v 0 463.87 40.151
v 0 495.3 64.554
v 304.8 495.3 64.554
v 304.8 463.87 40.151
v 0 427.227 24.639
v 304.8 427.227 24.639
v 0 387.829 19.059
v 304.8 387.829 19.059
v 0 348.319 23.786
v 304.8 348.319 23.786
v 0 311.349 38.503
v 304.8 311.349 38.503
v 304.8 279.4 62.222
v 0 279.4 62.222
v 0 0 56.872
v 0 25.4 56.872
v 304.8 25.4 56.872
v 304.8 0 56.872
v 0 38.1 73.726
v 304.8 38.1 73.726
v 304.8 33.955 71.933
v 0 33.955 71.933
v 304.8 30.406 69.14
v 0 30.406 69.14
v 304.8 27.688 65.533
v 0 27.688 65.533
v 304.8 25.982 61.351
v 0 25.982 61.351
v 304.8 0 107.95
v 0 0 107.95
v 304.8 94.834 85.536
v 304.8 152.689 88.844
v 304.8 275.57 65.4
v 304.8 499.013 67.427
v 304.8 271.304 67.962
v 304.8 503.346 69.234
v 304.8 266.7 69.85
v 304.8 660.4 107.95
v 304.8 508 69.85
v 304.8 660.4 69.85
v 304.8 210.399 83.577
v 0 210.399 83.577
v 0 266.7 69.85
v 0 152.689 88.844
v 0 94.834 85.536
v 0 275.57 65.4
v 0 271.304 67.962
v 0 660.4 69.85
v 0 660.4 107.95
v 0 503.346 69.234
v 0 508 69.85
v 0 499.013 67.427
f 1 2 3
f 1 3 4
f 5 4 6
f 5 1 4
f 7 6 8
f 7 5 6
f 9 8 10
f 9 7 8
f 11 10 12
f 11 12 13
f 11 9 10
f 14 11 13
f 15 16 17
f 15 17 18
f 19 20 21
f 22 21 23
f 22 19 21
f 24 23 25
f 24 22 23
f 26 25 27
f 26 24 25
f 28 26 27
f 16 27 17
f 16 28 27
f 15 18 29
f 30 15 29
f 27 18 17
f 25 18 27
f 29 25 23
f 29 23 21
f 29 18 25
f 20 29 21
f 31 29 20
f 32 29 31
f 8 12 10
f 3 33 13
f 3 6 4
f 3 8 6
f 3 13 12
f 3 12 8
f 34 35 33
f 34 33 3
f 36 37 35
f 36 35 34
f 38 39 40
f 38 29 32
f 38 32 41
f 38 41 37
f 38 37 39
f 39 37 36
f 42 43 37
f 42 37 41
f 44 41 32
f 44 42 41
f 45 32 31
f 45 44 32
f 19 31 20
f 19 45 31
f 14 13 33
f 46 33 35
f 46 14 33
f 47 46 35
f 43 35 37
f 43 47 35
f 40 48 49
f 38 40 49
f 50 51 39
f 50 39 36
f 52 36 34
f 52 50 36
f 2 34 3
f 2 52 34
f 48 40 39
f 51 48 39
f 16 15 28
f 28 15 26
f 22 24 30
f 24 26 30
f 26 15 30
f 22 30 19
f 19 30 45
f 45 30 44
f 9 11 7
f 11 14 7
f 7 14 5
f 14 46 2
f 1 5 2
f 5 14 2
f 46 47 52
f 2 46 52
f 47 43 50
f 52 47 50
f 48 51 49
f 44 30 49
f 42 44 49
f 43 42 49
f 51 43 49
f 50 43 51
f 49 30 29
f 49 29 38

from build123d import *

# Parameters (mm, degrees)
F1_W     = 660.4
F1_H     = 107.95
F2_DEPTH = 304.8
F3_DEPTH = 304.801


with BuildPart() as f2:
    # F1 (on Right) → F2 (new body)
    with BuildSketch(Plane.YZ):
        with Locations((330.2, 53.975)):
            Rectangle(F1_W, F1_H)
    extrude(amount=F2_DEPTH)

    # F0 (on Right) → F3 (cut, through all)
    with BuildSketch(Plane.YZ):
        with BuildLine():
            Line((0, 0), (25.4, 0))
            Line((25.4, 0), (635, 0))
            Line((635, 0), (660.4, 0))
            Line((660.4, 0), (660.4, 69.85))
            Line((660.4, 69.85), (635, 69.85))
            Line((635, 69.85), (508, 69.85))
            ThreePointArc((508, 69.85), (501.120084, 68.473081), (495.3, 64.554436))
            ThreePointArc((495.3, 64.554436), (387.828804, 19.05896), (279.4, 62.222496))
            ThreePointArc((279.4, 62.222496), (273.485985, 66.762175), (266.7, 69.85))
            ThreePointArc((266.7, 69.85), (152.689214, 88.843713), (38.1, 73.726423))
            ThreePointArc((38.1, 73.726423), (28.93043, 67.423949), (25.4, 56.872255))
            Line((25.4, 56.872255), (0, 56.872255))
            Line((0, 56.872255), (0, 0))
        make_face()
    extrude(amount=F3_DEPTH, mode=Mode.SUBTRACT)


solid = f2.part
